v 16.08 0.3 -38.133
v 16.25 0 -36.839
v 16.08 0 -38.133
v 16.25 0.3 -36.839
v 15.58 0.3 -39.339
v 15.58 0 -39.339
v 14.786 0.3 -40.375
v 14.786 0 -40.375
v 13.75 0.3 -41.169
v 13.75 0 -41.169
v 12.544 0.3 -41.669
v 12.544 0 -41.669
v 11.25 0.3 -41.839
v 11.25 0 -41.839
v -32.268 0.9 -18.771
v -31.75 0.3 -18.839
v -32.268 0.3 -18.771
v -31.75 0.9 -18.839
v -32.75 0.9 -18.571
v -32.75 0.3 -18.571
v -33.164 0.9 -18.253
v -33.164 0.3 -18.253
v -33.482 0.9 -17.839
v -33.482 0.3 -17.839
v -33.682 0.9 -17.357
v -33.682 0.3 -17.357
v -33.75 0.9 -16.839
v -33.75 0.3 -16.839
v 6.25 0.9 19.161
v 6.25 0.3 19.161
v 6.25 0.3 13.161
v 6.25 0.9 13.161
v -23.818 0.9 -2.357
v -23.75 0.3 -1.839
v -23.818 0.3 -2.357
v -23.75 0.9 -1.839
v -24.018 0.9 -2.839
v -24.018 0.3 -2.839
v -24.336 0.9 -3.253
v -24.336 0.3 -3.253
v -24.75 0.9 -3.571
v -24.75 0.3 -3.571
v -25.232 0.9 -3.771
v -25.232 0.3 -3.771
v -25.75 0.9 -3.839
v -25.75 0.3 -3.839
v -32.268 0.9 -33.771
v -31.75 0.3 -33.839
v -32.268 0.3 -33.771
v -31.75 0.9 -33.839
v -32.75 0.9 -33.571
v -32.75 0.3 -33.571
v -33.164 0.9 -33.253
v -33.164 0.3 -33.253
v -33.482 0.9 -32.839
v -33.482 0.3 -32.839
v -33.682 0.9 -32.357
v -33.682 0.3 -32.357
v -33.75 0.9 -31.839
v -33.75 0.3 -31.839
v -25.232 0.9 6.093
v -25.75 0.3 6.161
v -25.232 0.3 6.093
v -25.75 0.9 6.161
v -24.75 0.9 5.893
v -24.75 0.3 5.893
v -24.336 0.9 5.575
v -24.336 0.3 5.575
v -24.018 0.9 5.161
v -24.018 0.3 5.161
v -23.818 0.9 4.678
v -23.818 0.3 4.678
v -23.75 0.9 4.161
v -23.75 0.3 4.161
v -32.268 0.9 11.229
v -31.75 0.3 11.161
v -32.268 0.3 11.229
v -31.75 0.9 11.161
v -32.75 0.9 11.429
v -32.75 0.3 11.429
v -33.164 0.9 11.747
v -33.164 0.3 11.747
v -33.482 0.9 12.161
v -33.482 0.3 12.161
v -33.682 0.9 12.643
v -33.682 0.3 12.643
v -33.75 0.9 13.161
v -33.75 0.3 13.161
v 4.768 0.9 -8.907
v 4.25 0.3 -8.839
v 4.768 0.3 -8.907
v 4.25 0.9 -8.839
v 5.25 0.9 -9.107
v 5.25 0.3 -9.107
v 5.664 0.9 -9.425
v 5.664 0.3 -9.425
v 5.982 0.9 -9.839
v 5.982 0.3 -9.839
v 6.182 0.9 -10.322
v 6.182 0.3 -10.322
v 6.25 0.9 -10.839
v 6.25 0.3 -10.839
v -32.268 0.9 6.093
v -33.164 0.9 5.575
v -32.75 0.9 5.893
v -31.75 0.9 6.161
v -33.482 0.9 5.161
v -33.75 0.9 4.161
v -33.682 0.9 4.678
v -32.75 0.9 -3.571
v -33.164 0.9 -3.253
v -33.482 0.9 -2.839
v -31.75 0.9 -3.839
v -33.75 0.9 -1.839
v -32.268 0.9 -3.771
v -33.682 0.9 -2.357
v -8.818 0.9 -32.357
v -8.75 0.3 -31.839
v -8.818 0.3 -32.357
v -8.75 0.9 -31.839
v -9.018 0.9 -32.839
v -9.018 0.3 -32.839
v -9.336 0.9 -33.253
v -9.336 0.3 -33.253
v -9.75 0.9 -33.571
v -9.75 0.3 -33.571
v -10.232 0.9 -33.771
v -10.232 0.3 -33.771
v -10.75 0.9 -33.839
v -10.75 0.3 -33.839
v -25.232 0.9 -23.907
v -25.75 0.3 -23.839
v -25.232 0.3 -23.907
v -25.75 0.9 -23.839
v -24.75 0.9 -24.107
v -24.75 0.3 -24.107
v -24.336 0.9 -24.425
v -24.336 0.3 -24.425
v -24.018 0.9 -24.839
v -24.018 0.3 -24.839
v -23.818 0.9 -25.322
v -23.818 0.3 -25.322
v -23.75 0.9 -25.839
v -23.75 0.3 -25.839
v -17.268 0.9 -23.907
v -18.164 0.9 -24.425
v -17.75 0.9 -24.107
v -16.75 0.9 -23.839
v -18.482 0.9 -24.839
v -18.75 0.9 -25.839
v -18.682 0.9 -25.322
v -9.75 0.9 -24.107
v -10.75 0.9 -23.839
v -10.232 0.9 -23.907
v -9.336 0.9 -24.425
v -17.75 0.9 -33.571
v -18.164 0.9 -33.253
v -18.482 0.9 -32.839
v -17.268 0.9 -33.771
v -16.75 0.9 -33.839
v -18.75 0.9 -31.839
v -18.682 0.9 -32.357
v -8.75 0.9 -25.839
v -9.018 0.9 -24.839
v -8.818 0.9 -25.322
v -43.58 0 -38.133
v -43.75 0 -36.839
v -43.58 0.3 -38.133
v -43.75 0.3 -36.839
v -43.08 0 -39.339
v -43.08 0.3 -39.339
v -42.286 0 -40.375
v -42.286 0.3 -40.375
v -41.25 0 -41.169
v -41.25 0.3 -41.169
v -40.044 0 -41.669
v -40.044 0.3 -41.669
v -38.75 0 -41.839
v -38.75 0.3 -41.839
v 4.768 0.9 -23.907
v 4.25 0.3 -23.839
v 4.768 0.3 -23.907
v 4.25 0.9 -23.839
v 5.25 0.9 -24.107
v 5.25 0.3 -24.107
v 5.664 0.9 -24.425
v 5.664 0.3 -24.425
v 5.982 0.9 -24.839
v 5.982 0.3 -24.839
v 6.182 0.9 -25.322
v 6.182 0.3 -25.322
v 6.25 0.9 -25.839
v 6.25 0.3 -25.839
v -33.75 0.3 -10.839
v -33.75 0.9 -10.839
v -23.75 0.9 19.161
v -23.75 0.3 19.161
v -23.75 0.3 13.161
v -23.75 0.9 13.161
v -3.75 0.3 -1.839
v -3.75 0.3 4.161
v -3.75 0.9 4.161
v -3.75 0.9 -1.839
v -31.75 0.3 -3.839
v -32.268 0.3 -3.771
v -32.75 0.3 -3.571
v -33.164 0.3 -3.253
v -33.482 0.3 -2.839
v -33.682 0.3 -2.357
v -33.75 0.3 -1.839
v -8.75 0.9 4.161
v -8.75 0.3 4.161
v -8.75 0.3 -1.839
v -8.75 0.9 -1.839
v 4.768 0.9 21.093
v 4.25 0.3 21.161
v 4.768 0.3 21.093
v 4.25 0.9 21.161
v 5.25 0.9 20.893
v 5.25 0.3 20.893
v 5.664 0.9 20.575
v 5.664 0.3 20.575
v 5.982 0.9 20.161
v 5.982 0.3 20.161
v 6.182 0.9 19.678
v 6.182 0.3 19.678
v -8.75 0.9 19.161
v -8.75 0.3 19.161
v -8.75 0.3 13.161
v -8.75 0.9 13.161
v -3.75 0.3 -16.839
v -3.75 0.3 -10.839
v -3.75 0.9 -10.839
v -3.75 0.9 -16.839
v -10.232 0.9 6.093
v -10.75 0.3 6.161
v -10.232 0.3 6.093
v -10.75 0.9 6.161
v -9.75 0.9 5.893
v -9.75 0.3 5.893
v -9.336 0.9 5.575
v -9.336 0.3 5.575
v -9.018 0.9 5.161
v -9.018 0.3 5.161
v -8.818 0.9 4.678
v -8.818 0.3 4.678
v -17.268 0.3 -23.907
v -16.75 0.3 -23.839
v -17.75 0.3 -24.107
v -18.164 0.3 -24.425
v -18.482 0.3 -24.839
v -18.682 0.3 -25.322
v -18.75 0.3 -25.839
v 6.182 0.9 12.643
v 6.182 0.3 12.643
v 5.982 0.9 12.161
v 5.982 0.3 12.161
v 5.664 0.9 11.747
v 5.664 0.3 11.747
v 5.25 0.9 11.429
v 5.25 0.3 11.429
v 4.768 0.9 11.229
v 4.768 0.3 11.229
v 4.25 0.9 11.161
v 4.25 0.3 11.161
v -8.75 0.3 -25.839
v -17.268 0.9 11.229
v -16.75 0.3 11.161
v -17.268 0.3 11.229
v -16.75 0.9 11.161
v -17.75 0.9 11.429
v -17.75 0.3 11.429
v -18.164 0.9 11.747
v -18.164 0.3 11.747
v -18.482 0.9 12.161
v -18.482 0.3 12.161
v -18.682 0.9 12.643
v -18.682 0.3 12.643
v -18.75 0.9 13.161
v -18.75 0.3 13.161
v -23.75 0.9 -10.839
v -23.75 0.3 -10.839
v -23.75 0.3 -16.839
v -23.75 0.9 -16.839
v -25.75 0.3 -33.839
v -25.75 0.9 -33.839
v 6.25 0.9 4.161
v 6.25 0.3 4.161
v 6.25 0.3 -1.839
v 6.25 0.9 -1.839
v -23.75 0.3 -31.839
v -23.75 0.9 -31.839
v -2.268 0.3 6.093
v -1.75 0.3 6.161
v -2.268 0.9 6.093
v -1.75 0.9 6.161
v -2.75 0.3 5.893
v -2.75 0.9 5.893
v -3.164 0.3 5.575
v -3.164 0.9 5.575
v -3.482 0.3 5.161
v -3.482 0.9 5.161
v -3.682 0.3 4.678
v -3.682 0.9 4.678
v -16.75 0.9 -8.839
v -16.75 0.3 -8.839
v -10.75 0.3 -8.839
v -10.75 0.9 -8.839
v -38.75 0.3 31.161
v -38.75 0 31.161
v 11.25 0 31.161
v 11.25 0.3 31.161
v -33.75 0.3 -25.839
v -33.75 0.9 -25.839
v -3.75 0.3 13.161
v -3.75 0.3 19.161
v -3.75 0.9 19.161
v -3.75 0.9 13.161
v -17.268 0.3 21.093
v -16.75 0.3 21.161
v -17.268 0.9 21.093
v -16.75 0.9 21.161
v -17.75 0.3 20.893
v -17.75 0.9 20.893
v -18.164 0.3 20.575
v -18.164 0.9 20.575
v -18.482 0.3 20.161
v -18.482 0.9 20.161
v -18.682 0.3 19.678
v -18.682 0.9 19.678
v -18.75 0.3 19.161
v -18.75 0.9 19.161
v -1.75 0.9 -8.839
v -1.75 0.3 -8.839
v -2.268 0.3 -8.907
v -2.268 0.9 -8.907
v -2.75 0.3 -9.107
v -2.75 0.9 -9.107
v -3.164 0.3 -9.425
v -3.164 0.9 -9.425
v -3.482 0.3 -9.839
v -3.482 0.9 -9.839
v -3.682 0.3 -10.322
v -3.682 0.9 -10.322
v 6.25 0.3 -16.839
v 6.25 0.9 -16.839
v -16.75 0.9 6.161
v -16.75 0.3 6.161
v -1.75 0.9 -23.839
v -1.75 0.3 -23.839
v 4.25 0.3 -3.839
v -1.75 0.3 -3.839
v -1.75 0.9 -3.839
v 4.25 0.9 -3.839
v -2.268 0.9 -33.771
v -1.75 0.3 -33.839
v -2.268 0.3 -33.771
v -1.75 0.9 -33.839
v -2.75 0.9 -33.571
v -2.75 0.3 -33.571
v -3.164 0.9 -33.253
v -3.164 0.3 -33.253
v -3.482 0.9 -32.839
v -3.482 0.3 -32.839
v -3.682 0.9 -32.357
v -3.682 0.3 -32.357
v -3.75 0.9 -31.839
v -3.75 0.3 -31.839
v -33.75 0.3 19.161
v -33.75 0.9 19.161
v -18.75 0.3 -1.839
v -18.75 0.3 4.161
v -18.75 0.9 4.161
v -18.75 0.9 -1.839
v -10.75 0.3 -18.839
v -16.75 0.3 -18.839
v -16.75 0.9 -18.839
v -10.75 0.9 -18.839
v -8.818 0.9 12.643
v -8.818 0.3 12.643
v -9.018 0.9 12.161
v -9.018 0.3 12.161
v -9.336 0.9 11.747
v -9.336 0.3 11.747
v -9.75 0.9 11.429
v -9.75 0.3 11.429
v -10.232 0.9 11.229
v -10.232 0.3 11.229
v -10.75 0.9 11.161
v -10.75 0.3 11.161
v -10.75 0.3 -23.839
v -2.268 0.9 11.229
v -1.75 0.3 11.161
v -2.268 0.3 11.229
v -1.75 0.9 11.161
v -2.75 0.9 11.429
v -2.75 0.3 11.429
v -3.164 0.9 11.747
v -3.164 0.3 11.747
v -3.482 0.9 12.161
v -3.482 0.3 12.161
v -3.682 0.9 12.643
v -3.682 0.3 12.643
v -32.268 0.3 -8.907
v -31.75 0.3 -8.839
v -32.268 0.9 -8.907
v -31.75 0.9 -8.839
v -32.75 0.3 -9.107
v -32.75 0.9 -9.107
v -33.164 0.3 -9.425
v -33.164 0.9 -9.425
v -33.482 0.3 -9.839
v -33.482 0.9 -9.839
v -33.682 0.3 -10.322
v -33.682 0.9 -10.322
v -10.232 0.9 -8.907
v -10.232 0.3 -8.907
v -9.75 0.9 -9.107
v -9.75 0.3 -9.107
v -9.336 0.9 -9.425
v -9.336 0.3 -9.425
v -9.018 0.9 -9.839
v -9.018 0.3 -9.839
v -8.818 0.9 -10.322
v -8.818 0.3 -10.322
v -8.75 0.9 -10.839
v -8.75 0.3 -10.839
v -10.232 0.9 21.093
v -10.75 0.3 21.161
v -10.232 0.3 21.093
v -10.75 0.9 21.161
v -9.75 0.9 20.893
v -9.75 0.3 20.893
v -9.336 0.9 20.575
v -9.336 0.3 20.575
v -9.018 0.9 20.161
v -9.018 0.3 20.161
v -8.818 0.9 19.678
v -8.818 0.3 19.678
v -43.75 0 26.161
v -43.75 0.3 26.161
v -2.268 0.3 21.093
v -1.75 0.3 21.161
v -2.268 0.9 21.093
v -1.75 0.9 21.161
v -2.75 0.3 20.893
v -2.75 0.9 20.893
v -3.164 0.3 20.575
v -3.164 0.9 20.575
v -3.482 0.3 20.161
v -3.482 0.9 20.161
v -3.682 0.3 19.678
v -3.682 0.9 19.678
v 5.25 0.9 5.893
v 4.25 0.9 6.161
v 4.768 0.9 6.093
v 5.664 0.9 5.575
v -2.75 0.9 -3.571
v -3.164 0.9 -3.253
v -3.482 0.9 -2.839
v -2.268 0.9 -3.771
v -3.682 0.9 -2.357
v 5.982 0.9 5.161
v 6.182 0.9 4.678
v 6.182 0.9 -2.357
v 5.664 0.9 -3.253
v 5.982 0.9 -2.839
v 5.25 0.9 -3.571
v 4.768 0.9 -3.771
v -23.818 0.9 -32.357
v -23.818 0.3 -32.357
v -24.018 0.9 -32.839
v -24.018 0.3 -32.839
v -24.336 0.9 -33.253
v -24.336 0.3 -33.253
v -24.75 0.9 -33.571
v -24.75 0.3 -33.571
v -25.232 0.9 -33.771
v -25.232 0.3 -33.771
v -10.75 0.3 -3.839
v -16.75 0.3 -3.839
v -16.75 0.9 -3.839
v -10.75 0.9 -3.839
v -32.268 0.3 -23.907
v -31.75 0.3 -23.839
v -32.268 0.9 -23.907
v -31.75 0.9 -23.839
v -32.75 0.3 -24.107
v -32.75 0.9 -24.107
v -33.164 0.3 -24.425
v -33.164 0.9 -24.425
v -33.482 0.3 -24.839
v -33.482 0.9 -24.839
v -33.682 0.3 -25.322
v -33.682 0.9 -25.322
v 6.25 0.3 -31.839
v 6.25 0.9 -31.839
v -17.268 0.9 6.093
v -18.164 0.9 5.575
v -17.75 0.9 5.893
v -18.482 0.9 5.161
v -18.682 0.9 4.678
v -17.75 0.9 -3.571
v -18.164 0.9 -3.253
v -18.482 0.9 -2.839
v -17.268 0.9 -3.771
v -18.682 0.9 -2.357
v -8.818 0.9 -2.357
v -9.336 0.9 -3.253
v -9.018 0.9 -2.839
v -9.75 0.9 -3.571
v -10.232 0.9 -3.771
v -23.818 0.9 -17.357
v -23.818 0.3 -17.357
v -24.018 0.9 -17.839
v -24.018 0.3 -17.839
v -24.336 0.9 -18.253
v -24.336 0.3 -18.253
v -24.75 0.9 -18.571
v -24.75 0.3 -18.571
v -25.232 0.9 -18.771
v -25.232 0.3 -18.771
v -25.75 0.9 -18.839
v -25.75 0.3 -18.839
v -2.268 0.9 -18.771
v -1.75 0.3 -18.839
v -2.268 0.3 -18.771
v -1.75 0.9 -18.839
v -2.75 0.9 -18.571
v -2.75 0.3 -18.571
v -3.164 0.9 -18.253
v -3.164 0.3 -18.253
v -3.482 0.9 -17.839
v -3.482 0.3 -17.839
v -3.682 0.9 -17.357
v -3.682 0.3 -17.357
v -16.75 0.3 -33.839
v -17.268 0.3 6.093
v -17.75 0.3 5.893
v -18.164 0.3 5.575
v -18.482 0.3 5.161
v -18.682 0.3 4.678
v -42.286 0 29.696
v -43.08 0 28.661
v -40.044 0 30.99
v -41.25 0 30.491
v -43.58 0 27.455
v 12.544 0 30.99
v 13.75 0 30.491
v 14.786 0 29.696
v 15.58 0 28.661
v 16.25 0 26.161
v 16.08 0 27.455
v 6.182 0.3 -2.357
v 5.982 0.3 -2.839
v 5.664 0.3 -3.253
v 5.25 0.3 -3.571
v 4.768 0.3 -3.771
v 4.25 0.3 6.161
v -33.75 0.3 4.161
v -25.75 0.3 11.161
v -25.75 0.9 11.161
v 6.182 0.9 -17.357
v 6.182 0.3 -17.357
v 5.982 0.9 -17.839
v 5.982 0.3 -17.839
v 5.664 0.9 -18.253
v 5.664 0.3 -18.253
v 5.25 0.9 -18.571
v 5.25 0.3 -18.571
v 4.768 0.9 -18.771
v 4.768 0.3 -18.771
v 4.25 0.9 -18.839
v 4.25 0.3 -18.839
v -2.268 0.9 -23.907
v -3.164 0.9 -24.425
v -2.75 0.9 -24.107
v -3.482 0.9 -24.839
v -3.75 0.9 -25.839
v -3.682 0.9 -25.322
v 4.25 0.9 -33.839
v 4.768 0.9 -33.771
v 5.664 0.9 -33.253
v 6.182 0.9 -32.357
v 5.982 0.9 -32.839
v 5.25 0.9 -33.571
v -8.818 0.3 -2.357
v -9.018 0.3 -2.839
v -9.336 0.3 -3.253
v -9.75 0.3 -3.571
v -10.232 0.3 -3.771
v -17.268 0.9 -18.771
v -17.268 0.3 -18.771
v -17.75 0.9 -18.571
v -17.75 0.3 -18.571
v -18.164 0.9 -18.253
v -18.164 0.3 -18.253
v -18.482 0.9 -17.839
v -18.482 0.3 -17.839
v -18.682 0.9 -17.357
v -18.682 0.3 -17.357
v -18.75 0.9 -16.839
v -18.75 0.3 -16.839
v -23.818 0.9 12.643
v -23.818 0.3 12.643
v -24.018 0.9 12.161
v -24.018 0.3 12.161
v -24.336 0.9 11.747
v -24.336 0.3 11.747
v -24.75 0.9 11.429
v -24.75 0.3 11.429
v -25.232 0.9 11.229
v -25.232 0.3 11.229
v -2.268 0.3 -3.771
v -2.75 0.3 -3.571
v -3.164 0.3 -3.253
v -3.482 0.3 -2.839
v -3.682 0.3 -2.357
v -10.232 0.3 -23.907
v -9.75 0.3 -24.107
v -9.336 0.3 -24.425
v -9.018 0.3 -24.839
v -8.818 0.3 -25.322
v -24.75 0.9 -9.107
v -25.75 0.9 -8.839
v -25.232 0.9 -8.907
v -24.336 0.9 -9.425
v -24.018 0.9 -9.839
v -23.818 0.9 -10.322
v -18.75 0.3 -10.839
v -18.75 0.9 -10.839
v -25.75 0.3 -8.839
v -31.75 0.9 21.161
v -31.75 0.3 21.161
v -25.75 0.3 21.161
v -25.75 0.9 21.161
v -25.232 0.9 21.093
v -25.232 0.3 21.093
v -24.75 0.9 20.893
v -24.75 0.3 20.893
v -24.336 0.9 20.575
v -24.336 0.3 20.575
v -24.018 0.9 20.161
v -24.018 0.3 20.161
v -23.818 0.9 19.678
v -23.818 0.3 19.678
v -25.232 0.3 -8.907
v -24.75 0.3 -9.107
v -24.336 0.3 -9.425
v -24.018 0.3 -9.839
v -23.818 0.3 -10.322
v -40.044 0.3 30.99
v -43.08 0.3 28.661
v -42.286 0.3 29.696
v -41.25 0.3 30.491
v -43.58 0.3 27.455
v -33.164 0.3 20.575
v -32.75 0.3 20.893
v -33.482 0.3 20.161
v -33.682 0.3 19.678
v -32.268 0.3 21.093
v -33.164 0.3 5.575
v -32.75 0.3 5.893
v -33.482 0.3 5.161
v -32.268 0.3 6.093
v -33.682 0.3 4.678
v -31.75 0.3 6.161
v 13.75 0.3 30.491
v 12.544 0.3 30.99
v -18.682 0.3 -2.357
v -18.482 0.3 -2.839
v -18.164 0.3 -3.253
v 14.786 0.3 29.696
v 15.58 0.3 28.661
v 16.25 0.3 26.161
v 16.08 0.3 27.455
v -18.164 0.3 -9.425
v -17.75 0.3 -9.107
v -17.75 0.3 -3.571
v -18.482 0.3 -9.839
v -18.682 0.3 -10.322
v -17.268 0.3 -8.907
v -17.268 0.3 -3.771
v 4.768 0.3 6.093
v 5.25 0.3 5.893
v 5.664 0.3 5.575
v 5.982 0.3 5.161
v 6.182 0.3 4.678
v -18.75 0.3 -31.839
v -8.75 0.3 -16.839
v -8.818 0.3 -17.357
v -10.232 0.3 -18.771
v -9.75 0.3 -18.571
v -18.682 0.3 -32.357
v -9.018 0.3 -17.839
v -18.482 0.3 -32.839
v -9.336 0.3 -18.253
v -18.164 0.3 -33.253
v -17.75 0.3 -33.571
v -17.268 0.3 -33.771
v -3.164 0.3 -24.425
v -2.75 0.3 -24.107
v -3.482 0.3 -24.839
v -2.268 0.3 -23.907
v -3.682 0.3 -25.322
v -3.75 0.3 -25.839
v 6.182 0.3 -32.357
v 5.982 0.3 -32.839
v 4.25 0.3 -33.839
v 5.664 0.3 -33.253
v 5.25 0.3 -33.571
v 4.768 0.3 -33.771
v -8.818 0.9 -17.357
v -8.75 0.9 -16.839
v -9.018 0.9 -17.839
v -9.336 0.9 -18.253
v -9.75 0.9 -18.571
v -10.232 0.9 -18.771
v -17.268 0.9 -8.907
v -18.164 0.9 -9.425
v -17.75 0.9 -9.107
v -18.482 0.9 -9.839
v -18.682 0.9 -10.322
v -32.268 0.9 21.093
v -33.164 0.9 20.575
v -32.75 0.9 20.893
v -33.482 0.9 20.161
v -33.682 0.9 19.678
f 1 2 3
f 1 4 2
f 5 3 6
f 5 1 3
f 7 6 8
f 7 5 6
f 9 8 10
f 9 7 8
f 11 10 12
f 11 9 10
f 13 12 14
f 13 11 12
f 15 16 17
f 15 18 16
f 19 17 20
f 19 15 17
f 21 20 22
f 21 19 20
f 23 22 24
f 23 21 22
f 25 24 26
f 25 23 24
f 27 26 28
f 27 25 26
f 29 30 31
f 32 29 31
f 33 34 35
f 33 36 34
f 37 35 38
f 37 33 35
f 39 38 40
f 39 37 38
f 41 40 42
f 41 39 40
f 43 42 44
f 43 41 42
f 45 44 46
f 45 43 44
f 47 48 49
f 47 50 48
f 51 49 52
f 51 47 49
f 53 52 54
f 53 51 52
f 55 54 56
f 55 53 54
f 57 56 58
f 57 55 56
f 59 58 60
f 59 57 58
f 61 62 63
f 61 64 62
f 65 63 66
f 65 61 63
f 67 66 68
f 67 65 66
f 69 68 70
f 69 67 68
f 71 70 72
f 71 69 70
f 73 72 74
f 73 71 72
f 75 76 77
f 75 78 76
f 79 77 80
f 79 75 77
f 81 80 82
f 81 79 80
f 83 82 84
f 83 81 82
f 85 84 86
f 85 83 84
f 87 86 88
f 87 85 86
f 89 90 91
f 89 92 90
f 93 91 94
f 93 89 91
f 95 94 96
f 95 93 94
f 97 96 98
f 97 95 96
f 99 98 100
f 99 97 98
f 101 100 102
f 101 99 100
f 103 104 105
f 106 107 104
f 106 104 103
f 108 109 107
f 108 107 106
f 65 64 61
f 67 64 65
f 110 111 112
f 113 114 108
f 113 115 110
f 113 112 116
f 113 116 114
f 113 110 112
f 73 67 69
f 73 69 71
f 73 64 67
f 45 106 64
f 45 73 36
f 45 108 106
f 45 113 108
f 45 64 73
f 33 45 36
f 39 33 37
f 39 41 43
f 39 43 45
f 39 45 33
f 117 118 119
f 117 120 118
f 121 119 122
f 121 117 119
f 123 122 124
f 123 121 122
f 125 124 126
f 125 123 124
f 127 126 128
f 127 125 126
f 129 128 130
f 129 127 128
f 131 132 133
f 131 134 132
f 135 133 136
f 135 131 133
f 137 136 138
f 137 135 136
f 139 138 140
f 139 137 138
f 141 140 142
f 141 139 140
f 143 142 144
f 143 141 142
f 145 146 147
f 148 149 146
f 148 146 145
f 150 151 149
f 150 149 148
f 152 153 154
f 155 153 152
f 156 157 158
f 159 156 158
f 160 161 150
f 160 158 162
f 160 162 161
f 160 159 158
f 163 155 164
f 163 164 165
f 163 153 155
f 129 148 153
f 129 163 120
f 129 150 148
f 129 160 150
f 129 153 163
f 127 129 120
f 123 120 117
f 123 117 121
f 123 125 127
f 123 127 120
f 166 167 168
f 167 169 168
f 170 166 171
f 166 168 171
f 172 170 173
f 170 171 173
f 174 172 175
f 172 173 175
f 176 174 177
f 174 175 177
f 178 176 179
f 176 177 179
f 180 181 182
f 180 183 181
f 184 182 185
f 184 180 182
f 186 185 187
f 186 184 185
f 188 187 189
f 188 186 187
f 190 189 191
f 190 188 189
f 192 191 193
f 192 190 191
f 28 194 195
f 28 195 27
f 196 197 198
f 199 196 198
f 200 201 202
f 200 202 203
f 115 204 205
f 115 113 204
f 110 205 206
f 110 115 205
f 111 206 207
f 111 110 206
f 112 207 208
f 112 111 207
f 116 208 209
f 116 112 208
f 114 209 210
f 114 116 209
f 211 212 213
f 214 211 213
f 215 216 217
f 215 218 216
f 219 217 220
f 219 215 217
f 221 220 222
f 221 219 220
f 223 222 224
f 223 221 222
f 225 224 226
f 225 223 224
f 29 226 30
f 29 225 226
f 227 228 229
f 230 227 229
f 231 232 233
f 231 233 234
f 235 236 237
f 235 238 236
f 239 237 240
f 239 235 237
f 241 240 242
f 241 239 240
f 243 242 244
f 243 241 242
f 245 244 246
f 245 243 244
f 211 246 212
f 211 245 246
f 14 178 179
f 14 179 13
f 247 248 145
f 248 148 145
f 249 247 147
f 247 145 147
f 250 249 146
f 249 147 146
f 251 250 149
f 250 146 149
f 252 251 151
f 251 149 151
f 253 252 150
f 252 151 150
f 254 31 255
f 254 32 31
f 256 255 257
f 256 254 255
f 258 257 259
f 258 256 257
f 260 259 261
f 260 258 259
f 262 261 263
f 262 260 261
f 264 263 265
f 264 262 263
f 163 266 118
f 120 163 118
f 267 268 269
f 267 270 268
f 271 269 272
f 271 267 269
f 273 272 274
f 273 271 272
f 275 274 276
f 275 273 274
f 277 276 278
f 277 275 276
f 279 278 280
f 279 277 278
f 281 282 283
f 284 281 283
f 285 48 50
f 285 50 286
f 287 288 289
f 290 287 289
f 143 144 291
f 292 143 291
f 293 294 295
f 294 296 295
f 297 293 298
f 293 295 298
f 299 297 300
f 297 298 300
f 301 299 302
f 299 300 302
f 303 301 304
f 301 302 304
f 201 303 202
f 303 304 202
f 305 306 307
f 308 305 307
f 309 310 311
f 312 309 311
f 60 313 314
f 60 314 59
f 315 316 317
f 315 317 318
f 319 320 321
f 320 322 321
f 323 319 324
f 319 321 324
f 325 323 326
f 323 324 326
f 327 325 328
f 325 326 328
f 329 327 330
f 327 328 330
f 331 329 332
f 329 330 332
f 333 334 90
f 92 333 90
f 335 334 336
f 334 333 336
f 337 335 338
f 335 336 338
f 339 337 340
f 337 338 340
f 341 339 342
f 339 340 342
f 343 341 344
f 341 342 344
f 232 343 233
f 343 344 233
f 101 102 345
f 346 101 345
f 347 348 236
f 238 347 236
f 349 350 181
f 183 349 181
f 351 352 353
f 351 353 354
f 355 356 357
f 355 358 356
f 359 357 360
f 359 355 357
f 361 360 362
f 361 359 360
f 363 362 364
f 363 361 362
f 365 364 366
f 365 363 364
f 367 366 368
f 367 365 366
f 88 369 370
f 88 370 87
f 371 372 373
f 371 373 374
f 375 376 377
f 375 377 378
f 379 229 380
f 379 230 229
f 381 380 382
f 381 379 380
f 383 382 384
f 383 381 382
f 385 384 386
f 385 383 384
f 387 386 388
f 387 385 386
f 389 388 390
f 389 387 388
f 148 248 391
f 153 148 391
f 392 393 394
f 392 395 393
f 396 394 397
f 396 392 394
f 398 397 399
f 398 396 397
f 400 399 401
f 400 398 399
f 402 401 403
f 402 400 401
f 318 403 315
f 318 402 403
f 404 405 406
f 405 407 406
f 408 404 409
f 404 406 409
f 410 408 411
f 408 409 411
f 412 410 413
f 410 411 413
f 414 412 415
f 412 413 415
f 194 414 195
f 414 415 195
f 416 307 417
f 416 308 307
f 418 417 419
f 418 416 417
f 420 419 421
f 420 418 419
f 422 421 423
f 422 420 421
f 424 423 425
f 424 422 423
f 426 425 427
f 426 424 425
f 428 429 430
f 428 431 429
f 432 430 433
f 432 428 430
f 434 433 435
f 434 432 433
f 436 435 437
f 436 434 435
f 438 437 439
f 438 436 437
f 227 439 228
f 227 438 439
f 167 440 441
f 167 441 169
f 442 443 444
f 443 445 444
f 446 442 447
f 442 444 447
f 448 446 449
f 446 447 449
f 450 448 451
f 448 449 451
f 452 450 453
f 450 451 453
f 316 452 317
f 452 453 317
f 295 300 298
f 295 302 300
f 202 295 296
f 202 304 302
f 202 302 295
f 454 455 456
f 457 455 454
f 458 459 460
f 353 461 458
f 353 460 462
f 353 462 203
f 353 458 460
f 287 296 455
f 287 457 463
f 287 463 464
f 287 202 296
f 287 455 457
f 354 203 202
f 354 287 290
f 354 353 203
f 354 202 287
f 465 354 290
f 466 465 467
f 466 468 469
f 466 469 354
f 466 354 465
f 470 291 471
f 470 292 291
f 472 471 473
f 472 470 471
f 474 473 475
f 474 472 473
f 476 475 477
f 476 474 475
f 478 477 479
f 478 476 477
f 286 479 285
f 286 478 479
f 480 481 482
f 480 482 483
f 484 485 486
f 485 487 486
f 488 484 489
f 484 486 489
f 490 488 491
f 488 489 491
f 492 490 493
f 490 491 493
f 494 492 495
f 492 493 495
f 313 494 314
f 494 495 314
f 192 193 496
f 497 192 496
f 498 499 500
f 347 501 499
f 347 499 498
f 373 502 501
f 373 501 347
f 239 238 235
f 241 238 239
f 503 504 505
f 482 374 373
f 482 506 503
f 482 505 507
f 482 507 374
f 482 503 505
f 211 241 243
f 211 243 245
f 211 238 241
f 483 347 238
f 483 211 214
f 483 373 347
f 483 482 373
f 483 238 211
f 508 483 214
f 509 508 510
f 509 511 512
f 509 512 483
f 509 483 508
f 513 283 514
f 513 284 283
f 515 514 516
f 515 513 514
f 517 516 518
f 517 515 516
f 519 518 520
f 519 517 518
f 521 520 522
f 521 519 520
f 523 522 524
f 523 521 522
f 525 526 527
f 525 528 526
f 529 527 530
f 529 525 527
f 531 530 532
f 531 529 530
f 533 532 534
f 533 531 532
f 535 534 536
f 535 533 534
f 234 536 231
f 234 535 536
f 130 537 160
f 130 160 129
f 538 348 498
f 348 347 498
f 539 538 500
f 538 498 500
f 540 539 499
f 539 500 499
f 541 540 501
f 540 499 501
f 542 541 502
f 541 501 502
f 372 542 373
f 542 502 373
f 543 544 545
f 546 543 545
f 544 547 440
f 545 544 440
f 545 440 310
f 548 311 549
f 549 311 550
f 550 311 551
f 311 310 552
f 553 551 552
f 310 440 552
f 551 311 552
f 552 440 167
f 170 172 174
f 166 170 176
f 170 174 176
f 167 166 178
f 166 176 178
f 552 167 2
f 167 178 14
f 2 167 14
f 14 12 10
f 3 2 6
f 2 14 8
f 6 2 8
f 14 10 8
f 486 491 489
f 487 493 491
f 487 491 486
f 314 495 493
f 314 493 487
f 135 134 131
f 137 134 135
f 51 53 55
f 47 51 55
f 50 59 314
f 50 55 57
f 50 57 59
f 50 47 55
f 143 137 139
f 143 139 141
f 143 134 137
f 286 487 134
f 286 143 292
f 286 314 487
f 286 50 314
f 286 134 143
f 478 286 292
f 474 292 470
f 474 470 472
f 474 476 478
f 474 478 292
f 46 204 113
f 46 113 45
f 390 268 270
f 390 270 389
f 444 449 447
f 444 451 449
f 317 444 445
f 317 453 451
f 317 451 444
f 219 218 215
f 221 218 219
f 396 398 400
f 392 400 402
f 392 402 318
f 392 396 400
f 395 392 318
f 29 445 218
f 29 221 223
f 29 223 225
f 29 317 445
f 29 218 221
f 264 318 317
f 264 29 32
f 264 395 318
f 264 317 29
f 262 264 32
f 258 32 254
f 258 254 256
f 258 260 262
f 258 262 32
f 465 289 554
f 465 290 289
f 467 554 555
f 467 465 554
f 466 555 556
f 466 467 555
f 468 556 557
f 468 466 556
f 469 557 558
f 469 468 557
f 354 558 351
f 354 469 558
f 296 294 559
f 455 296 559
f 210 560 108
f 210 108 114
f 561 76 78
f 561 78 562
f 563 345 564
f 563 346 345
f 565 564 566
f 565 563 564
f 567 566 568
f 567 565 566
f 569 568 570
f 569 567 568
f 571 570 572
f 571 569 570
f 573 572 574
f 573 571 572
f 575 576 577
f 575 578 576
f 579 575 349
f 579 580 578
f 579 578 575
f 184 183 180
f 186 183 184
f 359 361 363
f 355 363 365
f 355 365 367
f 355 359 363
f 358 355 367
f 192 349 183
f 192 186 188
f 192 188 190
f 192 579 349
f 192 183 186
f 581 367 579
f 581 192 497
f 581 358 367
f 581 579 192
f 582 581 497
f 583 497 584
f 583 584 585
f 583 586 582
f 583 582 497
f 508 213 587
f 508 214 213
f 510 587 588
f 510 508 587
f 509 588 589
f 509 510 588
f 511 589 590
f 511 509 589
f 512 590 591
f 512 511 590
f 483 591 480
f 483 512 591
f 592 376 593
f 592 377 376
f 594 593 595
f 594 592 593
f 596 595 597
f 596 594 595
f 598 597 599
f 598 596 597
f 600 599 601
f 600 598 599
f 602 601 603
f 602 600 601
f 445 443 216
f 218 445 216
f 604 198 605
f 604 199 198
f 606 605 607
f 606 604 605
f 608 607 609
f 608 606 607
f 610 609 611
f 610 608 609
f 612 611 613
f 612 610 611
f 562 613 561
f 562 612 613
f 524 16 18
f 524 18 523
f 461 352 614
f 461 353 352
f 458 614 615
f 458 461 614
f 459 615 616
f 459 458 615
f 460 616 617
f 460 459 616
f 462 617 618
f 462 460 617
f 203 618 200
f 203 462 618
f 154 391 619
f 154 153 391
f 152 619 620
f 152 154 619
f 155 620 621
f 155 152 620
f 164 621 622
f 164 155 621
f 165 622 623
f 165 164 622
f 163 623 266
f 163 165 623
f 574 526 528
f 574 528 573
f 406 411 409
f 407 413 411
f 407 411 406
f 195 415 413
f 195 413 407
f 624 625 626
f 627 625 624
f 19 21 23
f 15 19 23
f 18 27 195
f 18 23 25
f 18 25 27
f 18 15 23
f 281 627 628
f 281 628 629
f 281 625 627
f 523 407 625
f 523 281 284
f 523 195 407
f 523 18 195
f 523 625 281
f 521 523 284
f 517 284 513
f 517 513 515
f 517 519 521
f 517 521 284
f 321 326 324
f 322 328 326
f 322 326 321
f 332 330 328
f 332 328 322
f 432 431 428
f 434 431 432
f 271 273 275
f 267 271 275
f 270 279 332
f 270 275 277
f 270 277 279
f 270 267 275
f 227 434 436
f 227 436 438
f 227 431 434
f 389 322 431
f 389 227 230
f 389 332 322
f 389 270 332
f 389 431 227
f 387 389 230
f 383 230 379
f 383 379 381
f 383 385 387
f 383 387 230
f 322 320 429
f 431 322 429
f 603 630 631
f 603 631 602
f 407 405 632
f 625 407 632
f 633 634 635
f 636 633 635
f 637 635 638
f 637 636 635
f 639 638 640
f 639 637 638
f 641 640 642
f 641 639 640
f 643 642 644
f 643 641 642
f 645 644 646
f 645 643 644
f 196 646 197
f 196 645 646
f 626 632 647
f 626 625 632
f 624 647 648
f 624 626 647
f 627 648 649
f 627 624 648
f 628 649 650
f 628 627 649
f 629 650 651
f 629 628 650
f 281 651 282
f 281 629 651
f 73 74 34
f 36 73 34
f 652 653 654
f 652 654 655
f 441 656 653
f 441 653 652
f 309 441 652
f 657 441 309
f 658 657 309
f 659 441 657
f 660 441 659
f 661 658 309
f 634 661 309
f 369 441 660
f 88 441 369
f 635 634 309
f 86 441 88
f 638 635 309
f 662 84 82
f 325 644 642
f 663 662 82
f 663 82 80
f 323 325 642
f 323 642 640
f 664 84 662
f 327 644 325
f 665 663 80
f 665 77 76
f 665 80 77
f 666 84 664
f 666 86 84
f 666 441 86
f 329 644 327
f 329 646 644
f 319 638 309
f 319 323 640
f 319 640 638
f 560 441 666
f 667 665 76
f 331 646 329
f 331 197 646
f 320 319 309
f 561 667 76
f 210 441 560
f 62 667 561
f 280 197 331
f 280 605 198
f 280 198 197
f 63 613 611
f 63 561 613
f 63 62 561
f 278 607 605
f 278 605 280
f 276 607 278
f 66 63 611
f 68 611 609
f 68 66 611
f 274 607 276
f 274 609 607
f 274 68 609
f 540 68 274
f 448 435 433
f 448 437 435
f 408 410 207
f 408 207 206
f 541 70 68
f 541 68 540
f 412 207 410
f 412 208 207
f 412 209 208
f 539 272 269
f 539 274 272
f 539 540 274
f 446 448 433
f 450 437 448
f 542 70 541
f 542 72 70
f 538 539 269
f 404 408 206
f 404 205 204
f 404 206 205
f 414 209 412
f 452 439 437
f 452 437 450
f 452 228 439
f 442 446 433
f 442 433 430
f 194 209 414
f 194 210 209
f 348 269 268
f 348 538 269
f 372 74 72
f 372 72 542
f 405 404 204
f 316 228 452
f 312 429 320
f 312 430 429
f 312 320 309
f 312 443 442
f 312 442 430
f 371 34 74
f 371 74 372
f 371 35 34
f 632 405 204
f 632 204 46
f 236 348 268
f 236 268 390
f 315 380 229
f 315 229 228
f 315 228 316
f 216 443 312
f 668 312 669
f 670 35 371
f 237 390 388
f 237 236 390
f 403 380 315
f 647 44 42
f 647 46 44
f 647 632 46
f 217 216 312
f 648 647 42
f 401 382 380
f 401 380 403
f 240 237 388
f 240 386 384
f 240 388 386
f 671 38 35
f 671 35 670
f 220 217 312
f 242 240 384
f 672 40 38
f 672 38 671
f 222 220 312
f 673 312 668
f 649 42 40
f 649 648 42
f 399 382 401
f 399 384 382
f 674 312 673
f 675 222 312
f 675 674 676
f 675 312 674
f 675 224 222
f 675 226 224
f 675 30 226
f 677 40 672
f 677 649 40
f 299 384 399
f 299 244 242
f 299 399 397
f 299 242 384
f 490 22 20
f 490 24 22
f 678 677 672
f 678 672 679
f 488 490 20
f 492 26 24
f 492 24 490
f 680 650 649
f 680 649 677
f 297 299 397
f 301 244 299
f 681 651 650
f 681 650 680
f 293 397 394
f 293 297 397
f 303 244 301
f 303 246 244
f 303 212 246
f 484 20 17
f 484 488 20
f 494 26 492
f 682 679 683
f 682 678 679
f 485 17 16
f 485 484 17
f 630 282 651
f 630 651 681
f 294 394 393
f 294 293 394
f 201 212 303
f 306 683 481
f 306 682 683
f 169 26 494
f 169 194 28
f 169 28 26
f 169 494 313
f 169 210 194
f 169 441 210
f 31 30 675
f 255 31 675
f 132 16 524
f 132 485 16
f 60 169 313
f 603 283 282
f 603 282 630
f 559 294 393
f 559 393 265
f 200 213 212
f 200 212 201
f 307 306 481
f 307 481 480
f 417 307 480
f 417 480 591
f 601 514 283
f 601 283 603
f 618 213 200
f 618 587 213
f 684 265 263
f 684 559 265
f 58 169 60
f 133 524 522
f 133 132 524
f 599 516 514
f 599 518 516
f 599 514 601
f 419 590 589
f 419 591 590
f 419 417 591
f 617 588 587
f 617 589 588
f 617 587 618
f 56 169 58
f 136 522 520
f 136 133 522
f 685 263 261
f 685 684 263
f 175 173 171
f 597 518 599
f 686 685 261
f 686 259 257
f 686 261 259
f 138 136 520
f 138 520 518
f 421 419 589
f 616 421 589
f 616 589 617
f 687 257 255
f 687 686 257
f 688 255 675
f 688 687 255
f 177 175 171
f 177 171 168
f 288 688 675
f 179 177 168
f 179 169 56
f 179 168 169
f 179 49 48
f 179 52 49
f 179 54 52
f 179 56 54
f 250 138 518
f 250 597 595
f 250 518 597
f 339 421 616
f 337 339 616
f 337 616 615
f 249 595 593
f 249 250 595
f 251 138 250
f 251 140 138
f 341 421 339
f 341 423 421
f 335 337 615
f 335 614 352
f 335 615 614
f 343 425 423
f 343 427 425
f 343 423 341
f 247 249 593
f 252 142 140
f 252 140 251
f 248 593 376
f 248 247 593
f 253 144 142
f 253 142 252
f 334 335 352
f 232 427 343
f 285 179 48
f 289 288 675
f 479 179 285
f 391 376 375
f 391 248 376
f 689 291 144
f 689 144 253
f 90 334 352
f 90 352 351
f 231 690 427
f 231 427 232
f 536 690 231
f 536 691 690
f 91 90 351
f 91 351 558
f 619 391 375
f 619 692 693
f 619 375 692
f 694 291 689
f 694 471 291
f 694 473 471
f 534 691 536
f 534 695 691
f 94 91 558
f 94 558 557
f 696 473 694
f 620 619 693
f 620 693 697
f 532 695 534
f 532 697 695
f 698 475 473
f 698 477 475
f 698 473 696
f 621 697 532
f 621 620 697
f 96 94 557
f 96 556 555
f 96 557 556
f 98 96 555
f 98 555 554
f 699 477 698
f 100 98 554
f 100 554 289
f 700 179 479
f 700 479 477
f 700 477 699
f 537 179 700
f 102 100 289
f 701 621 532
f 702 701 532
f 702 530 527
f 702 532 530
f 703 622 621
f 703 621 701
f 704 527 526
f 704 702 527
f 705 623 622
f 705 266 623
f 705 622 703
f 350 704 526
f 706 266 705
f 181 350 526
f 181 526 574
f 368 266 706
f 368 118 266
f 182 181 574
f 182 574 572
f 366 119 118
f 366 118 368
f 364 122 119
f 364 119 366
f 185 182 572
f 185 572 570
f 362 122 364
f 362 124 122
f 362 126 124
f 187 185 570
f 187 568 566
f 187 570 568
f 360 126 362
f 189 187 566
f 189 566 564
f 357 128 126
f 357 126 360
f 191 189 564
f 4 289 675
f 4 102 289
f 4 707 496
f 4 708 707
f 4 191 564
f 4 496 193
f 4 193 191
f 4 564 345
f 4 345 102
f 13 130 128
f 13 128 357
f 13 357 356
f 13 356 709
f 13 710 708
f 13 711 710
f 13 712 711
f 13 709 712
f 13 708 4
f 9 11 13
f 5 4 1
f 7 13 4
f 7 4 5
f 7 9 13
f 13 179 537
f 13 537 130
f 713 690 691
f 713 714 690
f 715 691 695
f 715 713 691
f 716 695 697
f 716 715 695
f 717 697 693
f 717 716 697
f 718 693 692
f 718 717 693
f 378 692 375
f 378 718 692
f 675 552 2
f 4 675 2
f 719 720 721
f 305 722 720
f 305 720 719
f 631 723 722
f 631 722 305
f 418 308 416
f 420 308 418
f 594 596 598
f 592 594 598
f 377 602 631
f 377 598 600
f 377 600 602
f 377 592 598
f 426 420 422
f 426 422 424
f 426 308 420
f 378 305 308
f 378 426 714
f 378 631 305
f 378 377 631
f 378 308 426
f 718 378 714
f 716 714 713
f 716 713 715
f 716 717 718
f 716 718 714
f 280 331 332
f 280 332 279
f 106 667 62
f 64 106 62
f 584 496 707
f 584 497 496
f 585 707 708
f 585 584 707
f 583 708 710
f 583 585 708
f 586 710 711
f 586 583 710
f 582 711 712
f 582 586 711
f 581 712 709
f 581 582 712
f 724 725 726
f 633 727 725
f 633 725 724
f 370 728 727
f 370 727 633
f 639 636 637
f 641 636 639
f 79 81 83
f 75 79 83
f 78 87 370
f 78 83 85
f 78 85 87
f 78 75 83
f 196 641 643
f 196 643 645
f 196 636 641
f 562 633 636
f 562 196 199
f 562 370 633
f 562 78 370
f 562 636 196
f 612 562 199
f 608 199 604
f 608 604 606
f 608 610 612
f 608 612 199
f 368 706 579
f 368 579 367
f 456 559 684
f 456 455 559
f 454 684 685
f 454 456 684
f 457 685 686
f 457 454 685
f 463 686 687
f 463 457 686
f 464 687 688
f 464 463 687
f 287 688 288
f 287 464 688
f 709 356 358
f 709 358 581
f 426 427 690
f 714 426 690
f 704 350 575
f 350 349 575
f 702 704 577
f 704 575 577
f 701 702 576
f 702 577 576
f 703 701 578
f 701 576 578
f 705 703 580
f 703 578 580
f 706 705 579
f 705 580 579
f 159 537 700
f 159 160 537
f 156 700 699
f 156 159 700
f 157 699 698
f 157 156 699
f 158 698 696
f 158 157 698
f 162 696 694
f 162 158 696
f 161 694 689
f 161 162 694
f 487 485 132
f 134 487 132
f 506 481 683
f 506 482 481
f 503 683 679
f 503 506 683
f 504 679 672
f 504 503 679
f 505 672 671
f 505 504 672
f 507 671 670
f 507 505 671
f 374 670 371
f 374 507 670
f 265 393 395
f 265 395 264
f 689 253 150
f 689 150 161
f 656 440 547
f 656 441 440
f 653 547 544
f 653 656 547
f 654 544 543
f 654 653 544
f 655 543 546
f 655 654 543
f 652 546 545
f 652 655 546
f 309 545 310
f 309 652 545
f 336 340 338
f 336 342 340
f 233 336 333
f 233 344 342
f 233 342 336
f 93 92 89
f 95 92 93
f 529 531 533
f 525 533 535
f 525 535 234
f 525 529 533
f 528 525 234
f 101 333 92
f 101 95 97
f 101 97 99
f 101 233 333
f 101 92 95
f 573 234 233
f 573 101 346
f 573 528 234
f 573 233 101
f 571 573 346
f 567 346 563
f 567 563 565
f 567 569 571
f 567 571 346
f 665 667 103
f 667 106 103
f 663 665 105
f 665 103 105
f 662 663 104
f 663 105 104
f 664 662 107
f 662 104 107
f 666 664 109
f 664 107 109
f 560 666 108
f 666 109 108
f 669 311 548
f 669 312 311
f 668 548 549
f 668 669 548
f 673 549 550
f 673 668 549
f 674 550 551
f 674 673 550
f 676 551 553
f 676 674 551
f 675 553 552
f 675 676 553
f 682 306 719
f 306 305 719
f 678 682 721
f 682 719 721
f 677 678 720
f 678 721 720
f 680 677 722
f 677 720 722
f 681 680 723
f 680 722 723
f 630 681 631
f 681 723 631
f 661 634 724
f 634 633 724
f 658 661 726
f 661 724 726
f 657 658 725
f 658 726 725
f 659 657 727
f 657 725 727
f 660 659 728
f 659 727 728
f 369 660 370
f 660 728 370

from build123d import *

# Parameters (mm, degrees)
SKETCH1_W              = 60
SKETCH1_H              = 73
BOSS_EXTRUDE1_DEPTH    = 0.3
FILLET1_R              = 5
SKETCH2_W              = 10
SKETCH2_H              = 10
BOSS_EXTRUDE2_DEPTH    = 0.6
FILLET2_R              = 2
LPATTERN1_COUNT        = 3
LPATTERN1_PITCH        = 15
LPATTERN1_COUNT_DIR2   = 4
LPATTERN1_PITCH_DIR2   = 15
FILLET2_OF_LPATTERN1_R = 2


with BuildPart() as part:
    # Sketch1 → Boss-Extrude1 (new body)
    with BuildSketch(Plane(origin=(0, 0, 0), x_dir=(1, 0, 0), z_dir=(0, 1, 0))):
        with Locations((-13.75, 5.339285714)):
            Rectangle(SKETCH1_W, SKETCH1_H)
    extrude(amount=BOSS_EXTRUDE1_DEPTH)

    # Fillet1
    fillet1_edges = [part.edges().sort_by_distance(p)[0] for p in [
        (-43.75, 0.15, -41.839285714),
        (16.25, 0.15, -41.839285714),
        (16.25, 0.15, 31.160714286),
        (-43.75, 0.15, 31.160714286),
    ]]
    fillet(fillet1_edges, radius=FILLET1_R)

    # Sketch2 → Boss-Extrude2 (add)
    with BuildSketch(Plane(origin=(0, 0.3, 0), x_dir=(1, 0, 0), z_dir=(0, 1, 0))):
        with Locations((1.25, -16.160714286)):
            Rectangle(SKETCH2_W, SKETCH2_H)
    boss_extrude2 = extrude(amount=BOSS_EXTRUDE2_DEPTH)

    # Fillet2
    fillet2_edges = [part.edges().sort_by_distance(p)[0] for p in [
        (6.25, 0.6, 21.160714286),
        (6.25, 0.6, 11.160714286),
        (-3.75, 0.6, 11.160714286),
        (-3.75, 0.6, 21.160714286),
    ]]
    fillet(fillet2_edges, radius=FILLET2_R)

    # LPattern1: Boss-Extrude2 3 × 4
    with Locations(*[(-i * LPATTERN1_PITCH, 0, -j * LPATTERN1_PITCH_DIR2) for i in range(LPATTERN1_COUNT) for j in range(LPATTERN1_COUNT_DIR2) if (i, j) != (0, 0)]):
        add(boss_extrude2)

    # Fillet2 of LPattern1
    fillet2_of_lpattern1_edges = [part.edges().sort_by_distance(p)[0] for p in [
        (6.25, 0.6, 6.160714286),
        (6.25, 0.6, -3.839285714),
        (-3.75, 0.6, -3.839285714),
        (-3.75, 0.6, 6.160714286),
        (6.25, 0.6, -8.839285714),
        (6.25, 0.6, -18.839285714),
        (-3.75, 0.6, -18.839285714),
        (-3.75, 0.6, -8.839285714),
        (6.25, 0.6, -23.839285714),
        (6.25, 0.6, -33.839285714),
        (-3.75, 0.6, -33.839285714),
        (-3.75, 0.6, -23.839285714),
        (-8.75, 0.6, 21.160714286),
        (-8.75, 0.6, 11.160714286),
        (-18.75, 0.6, 11.160714286),
        (-18.75, 0.6, 21.160714286),
        (-8.75, 0.6, 6.160714286),
        (-8.75, 0.6, -3.839285714),
        (-18.75, 0.6, -3.839285714),
        (-18.75, 0.6, 6.160714286),
        (-8.75, 0.6, -8.839285714),
        (-8.75, 0.6, -18.839285714),
        (-18.75, 0.6, -18.839285714),
        (-18.75, 0.6, -8.839285714),
        (-8.75, 0.6, -23.839285714),
        (-8.75, 0.6, -33.839285714),
        (-18.75, 0.6, -33.839285714),
        (-18.75, 0.6, -23.839285714),
        (-23.75, 0.6, 21.160714286),
        (-23.75, 0.6, 11.160714286),
        (-33.75, 0.6, 11.160714286),
        (-33.75, 0.6, 21.160714286),
        (-23.75, 0.6, 6.160714286),
        (-23.75, 0.6, -3.839285714),
        (-33.75, 0.6, -3.839285714),
        (-33.75, 0.6, 6.160714286),
        (-23.75, 0.6, -8.839285714),
        (-23.75, 0.6, -18.839285714),
        (-33.75, 0.6, -18.839285714),
        (-33.75, 0.6, -8.839285714),
        (-23.75, 0.6, -23.839285714),
        (-23.75, 0.6, -33.839285714),
        (-33.75, 0.6, -33.839285714),
        (-33.75, 0.6, -23.839285714),
    ]]
    fillet(fillet2_of_lpattern1_edges, radius=FILLET2_OF_LPATTERN1_R)


solid = part.part
